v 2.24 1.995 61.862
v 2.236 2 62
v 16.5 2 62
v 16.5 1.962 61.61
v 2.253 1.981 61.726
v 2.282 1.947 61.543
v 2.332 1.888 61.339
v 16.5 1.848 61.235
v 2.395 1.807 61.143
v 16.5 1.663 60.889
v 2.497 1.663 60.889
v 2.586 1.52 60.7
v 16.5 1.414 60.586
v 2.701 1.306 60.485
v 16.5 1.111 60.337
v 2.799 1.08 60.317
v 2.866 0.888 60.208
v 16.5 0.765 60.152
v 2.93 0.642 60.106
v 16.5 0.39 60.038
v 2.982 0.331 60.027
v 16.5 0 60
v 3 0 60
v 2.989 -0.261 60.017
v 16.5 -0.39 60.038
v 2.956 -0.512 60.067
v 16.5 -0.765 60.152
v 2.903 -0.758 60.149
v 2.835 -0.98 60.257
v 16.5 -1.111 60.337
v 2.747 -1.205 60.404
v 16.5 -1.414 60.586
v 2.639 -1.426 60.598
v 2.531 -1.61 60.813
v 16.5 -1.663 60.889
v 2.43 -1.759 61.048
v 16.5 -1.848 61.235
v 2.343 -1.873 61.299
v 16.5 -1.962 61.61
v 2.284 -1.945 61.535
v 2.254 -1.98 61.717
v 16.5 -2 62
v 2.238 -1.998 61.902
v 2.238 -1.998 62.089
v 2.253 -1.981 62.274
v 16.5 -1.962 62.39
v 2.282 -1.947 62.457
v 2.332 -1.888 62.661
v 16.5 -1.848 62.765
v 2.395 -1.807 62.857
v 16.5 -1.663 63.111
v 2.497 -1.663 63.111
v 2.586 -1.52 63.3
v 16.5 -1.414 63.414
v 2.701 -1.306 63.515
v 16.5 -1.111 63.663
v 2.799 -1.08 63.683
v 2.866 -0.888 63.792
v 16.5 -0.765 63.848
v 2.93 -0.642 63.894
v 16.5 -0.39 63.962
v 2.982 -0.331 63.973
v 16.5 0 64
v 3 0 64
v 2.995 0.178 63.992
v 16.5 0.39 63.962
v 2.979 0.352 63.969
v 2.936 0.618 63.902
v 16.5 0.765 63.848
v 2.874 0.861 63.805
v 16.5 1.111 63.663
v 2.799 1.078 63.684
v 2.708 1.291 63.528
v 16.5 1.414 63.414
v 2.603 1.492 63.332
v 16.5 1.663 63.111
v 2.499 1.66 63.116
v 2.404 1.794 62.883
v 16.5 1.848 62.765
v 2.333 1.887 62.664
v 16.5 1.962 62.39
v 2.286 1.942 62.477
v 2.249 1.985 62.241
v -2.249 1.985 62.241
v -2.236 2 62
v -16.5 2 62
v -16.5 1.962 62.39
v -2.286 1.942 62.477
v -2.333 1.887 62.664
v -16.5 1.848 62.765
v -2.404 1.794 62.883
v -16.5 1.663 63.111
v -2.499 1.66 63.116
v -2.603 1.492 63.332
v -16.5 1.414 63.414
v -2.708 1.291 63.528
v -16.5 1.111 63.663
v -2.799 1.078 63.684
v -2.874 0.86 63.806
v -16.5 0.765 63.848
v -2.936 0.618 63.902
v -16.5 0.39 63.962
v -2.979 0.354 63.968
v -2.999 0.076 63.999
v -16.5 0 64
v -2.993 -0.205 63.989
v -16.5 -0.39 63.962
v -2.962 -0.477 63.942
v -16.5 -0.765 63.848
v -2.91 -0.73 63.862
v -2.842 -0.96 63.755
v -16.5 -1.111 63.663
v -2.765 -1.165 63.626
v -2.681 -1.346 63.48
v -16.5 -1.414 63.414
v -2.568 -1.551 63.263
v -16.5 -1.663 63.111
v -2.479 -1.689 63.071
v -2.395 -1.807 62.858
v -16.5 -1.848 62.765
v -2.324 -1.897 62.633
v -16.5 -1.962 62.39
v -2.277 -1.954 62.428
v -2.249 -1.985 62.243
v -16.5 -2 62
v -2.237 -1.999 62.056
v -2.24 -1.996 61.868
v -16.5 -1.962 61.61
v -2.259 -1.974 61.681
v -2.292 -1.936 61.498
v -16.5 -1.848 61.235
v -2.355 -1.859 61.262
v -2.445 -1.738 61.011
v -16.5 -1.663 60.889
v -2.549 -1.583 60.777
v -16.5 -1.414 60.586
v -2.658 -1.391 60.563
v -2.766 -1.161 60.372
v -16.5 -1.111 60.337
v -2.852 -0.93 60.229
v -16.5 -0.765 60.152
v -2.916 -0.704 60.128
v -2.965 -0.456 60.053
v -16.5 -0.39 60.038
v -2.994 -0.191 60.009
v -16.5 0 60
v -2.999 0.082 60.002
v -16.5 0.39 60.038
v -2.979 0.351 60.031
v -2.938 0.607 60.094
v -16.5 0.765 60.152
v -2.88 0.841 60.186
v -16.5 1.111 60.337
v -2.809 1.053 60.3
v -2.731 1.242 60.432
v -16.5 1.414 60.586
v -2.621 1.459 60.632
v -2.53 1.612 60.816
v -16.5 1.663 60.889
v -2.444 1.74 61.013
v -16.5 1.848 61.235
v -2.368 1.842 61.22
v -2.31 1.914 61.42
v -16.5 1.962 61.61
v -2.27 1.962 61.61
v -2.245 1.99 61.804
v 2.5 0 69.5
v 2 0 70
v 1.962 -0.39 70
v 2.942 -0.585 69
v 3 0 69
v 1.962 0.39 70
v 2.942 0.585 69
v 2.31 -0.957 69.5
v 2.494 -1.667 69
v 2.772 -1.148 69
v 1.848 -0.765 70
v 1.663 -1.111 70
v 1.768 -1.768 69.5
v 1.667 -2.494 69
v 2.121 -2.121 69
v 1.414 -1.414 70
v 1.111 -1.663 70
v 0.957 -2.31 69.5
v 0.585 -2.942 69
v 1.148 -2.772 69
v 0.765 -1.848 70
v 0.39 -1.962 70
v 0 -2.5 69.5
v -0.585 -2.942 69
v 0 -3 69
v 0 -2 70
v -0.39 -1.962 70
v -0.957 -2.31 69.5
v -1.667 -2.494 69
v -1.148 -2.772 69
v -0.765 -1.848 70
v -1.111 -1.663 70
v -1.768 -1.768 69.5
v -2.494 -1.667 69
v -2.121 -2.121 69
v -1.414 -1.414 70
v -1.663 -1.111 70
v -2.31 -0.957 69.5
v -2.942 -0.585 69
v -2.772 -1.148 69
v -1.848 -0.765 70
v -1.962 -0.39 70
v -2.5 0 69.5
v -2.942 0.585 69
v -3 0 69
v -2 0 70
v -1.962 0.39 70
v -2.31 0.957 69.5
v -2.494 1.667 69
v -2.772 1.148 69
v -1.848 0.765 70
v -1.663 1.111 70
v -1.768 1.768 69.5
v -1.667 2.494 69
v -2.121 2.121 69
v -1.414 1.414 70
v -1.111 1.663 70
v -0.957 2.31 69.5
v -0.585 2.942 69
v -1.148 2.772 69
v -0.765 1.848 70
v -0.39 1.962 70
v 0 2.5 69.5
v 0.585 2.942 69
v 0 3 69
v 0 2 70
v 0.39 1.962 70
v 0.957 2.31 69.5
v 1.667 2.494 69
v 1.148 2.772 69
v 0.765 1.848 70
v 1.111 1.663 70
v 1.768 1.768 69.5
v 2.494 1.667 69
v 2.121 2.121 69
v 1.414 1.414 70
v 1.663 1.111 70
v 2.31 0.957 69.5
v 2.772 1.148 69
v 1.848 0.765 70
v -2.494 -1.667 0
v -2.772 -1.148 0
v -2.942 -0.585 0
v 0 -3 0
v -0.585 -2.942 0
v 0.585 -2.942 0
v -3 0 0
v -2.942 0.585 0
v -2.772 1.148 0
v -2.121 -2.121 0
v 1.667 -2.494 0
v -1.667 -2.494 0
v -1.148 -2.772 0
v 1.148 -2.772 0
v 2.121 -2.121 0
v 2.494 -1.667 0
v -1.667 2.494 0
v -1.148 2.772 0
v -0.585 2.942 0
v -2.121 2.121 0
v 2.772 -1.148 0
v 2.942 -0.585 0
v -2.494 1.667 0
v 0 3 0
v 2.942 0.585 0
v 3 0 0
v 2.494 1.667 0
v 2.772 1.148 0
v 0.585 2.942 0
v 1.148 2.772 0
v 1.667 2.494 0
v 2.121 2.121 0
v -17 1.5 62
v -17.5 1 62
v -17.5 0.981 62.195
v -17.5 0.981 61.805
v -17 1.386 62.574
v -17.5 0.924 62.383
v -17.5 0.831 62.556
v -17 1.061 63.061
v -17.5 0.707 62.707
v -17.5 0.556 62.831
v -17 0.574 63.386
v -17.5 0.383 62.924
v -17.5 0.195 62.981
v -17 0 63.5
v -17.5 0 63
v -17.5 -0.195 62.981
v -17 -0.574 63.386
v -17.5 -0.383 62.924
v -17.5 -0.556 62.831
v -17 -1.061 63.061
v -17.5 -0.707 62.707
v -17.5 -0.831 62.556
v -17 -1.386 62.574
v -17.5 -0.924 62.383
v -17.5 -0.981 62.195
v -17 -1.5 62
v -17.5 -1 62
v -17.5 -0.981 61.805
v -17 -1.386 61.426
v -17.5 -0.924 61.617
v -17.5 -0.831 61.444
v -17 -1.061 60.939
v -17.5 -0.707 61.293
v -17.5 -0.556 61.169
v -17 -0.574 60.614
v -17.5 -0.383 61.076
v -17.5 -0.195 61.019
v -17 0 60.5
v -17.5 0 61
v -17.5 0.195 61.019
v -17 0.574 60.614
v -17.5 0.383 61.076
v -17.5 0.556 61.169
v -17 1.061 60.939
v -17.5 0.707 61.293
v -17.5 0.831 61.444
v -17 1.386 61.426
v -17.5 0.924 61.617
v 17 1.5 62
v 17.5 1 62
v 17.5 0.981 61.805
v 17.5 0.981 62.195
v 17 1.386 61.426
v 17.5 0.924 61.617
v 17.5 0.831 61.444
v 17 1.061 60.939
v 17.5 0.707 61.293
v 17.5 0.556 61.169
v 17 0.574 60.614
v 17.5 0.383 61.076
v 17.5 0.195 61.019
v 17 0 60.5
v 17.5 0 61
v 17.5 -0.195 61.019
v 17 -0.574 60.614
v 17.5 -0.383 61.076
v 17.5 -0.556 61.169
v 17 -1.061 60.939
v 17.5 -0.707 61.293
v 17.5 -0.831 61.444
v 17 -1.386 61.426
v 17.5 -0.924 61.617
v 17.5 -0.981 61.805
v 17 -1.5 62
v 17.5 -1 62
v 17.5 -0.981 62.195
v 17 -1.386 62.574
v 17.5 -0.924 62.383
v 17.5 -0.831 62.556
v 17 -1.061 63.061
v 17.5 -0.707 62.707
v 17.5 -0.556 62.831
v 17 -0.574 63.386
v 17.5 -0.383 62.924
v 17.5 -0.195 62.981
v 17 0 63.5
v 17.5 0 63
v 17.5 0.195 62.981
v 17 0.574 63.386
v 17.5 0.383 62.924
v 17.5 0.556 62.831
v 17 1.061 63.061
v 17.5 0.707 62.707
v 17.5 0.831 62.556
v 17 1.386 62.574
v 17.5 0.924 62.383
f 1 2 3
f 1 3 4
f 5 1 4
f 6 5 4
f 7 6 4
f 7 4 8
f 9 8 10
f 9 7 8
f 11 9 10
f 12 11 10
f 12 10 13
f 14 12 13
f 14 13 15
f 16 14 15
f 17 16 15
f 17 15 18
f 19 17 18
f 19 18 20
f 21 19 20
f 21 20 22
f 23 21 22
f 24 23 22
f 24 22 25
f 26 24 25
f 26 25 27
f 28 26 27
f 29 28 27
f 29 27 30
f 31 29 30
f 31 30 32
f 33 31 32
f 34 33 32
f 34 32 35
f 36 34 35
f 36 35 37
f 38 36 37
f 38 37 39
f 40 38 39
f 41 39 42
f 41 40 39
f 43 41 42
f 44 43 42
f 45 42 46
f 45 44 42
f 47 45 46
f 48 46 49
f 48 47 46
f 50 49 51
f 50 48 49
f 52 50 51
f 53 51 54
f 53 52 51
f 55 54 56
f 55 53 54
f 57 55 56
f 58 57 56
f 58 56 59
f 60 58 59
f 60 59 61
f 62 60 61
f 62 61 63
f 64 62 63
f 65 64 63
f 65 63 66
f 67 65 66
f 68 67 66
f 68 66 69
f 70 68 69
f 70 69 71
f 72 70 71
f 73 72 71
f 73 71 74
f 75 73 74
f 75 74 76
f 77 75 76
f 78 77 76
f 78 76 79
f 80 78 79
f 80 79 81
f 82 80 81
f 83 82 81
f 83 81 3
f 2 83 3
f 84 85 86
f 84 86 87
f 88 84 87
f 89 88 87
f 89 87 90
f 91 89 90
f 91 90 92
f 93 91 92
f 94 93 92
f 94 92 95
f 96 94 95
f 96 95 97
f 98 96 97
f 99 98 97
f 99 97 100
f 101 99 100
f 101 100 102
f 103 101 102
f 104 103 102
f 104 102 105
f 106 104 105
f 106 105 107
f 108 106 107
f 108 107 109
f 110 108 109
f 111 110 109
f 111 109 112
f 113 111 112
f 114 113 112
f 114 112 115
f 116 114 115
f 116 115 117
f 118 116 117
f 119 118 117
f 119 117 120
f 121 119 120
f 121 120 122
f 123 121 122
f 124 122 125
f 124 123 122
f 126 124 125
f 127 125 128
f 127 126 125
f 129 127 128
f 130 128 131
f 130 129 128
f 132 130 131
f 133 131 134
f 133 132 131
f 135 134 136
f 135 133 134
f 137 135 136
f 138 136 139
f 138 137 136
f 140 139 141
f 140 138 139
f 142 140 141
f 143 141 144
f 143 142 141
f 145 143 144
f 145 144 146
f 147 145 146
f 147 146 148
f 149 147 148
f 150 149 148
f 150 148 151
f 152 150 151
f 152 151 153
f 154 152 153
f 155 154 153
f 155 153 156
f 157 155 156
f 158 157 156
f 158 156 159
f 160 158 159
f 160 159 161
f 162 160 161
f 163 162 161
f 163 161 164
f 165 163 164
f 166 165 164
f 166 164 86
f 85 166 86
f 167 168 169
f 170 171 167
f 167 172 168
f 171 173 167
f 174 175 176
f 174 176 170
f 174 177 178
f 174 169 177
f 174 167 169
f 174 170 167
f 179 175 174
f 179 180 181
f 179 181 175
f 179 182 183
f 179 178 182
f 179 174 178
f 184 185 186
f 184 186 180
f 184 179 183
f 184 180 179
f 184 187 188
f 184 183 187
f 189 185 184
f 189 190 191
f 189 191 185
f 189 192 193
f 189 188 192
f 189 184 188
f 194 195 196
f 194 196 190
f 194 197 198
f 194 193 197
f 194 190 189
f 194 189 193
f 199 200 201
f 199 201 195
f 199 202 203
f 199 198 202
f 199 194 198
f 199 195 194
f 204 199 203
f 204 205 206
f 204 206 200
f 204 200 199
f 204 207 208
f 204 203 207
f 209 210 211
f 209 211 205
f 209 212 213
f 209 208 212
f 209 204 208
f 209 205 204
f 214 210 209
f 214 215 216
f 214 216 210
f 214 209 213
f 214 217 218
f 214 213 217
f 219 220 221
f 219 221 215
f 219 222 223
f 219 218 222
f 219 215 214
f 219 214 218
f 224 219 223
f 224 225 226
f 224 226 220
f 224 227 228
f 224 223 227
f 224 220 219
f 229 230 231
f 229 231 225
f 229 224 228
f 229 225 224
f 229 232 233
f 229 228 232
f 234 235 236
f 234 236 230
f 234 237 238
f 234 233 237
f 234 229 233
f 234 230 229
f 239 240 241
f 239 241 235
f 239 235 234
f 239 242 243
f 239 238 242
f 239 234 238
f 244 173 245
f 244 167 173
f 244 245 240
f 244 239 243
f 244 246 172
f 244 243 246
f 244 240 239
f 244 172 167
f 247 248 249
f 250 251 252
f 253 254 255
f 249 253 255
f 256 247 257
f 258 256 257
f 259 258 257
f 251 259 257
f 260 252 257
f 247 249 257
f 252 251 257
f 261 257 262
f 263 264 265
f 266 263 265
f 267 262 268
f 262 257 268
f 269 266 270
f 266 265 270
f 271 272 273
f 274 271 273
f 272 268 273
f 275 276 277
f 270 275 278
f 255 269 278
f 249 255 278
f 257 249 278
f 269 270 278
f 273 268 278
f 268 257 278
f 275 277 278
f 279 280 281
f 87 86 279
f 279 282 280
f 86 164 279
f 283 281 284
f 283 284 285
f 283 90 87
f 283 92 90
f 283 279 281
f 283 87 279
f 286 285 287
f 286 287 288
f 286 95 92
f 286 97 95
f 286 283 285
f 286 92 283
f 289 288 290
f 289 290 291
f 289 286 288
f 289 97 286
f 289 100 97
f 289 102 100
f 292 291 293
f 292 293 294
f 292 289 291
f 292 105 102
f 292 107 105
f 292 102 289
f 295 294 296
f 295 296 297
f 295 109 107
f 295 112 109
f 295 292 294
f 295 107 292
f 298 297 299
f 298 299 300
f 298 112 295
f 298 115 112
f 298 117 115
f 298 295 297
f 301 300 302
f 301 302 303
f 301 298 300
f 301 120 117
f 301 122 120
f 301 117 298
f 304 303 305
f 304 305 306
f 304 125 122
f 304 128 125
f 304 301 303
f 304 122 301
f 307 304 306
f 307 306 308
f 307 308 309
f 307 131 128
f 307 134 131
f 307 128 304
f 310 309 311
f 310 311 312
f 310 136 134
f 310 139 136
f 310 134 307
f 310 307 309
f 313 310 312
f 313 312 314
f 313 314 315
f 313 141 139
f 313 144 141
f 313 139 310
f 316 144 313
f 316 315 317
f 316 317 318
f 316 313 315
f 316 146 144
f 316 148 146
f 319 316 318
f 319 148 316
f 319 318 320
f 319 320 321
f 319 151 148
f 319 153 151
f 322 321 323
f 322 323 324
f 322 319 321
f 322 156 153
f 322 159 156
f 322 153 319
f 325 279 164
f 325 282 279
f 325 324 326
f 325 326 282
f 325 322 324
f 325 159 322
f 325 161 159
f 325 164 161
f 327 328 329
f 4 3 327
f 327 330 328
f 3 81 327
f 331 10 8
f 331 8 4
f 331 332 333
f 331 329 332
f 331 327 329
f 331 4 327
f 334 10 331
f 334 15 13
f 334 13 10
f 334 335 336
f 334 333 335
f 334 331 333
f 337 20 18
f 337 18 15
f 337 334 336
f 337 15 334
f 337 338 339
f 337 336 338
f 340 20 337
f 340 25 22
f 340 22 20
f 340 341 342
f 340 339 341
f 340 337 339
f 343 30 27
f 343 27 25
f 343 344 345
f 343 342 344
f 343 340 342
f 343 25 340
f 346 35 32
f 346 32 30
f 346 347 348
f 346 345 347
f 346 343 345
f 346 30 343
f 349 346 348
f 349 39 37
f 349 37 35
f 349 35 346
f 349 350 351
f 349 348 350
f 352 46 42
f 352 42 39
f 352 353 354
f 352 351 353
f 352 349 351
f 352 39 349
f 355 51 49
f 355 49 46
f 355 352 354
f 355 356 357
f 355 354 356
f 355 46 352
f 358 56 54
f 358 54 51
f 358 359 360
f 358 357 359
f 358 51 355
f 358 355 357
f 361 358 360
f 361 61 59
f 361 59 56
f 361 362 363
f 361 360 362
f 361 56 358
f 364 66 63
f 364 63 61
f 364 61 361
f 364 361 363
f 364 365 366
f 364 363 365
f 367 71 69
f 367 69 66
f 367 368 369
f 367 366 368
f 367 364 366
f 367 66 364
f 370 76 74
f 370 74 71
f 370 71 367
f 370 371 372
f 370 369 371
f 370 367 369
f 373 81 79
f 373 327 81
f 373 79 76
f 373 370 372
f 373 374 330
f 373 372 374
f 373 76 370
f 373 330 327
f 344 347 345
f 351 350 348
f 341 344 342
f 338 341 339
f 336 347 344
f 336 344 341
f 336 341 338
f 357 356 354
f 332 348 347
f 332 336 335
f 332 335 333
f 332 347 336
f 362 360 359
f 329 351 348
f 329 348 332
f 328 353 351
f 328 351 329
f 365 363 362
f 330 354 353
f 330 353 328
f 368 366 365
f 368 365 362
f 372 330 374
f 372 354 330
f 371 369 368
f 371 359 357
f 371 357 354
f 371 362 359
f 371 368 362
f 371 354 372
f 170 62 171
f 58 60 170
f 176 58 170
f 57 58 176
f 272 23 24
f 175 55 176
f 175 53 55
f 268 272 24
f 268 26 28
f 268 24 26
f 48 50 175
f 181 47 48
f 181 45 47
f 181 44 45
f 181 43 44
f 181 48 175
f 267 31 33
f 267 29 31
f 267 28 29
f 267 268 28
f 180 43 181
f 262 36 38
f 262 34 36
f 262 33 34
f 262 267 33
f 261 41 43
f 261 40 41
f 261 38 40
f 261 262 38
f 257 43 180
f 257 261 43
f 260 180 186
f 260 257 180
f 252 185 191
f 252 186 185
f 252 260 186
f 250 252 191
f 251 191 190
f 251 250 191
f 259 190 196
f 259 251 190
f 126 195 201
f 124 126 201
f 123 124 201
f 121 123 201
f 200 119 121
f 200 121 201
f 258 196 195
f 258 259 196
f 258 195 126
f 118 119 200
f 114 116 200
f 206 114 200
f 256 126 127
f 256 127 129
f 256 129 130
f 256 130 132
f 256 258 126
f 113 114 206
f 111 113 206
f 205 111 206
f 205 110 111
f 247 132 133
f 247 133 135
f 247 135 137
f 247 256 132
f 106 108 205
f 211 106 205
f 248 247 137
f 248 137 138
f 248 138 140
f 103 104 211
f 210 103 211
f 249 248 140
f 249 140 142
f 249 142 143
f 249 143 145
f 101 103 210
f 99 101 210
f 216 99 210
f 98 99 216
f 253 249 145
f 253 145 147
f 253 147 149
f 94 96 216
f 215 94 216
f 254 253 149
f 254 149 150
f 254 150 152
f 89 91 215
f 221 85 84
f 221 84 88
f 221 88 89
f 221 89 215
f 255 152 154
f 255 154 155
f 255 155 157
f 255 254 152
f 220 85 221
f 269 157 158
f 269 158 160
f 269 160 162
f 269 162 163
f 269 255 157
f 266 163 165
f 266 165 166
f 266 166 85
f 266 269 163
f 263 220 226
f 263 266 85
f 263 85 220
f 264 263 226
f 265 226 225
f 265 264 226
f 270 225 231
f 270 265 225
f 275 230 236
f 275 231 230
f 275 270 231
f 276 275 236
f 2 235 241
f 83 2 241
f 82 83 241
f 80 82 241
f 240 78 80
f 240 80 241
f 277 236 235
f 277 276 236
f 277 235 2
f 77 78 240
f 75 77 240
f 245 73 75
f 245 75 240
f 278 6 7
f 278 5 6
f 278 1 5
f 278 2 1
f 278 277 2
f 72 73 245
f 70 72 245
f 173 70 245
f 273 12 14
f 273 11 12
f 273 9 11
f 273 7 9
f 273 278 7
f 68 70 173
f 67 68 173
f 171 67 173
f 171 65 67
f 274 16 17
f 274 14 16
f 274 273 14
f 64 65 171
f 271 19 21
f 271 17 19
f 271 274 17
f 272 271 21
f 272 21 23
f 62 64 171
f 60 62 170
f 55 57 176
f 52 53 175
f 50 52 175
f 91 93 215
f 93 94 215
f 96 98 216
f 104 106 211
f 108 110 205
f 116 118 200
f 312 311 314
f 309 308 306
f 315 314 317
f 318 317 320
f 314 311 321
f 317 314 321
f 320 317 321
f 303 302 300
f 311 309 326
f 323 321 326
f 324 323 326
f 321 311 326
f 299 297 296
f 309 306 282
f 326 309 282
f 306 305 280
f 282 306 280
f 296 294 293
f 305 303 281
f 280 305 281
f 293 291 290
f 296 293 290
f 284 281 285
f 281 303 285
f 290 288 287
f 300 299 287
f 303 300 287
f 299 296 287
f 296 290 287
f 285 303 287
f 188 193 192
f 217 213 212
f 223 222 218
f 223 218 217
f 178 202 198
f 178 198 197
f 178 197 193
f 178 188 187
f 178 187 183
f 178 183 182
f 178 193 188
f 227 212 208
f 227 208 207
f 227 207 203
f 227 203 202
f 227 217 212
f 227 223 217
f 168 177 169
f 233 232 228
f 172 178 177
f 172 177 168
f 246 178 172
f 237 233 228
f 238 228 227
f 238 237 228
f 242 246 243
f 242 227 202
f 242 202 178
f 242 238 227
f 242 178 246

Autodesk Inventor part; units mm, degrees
ref_plane "YZ Plane" through (0, 0, 0) normal (1, 0, 0) x (0, 1, 0)
ref_plane "XZ Plane" through (0, 0, 0) normal (0, 1, 0) x (-1, 0, 0)
ref_plane "XY Plane" through (0, 0, 0) normal (0, 0, 1) x (1, 0, 0)
sketch "Sketch1" plane through (0, 0, 0) normal (0, 0, 1) x (1, 0, 0)
  circle A0 centre (0, 0) radius 3
  dimension "d0" = 6
extrude "Extrusion1" add sketch "Sketch1" along normal blind 70
thread "Thread1" size "M6x1" class "6g" standard "ANSI Metric M Profile" length 55
chamfer "Chamfer1" distance 1 angle 45 1 edges at (-3, 0, 70)
sketch "Sketch2" plane through (0, 0, 0) normal (1, 0, 0) x (0, 1, 0)
  line L0 (-2, 70) -> (2, 70) construction
  line L1 (0, 70) -> (0, 62) construction
  circle A0 centre (0, 62) radius 2
  point P0 (0, 0)
  dimension "d8" = 8
  dimension "d9" = 4
extrude "Extrusion2" add sketch "Sketch2" along normal mid plane 35
chamfer "Chamfer2" distance 1 angle 45 2 edges at (17.5, -2, 62) (-17.5, -2, 62)
properties part number "screw"
